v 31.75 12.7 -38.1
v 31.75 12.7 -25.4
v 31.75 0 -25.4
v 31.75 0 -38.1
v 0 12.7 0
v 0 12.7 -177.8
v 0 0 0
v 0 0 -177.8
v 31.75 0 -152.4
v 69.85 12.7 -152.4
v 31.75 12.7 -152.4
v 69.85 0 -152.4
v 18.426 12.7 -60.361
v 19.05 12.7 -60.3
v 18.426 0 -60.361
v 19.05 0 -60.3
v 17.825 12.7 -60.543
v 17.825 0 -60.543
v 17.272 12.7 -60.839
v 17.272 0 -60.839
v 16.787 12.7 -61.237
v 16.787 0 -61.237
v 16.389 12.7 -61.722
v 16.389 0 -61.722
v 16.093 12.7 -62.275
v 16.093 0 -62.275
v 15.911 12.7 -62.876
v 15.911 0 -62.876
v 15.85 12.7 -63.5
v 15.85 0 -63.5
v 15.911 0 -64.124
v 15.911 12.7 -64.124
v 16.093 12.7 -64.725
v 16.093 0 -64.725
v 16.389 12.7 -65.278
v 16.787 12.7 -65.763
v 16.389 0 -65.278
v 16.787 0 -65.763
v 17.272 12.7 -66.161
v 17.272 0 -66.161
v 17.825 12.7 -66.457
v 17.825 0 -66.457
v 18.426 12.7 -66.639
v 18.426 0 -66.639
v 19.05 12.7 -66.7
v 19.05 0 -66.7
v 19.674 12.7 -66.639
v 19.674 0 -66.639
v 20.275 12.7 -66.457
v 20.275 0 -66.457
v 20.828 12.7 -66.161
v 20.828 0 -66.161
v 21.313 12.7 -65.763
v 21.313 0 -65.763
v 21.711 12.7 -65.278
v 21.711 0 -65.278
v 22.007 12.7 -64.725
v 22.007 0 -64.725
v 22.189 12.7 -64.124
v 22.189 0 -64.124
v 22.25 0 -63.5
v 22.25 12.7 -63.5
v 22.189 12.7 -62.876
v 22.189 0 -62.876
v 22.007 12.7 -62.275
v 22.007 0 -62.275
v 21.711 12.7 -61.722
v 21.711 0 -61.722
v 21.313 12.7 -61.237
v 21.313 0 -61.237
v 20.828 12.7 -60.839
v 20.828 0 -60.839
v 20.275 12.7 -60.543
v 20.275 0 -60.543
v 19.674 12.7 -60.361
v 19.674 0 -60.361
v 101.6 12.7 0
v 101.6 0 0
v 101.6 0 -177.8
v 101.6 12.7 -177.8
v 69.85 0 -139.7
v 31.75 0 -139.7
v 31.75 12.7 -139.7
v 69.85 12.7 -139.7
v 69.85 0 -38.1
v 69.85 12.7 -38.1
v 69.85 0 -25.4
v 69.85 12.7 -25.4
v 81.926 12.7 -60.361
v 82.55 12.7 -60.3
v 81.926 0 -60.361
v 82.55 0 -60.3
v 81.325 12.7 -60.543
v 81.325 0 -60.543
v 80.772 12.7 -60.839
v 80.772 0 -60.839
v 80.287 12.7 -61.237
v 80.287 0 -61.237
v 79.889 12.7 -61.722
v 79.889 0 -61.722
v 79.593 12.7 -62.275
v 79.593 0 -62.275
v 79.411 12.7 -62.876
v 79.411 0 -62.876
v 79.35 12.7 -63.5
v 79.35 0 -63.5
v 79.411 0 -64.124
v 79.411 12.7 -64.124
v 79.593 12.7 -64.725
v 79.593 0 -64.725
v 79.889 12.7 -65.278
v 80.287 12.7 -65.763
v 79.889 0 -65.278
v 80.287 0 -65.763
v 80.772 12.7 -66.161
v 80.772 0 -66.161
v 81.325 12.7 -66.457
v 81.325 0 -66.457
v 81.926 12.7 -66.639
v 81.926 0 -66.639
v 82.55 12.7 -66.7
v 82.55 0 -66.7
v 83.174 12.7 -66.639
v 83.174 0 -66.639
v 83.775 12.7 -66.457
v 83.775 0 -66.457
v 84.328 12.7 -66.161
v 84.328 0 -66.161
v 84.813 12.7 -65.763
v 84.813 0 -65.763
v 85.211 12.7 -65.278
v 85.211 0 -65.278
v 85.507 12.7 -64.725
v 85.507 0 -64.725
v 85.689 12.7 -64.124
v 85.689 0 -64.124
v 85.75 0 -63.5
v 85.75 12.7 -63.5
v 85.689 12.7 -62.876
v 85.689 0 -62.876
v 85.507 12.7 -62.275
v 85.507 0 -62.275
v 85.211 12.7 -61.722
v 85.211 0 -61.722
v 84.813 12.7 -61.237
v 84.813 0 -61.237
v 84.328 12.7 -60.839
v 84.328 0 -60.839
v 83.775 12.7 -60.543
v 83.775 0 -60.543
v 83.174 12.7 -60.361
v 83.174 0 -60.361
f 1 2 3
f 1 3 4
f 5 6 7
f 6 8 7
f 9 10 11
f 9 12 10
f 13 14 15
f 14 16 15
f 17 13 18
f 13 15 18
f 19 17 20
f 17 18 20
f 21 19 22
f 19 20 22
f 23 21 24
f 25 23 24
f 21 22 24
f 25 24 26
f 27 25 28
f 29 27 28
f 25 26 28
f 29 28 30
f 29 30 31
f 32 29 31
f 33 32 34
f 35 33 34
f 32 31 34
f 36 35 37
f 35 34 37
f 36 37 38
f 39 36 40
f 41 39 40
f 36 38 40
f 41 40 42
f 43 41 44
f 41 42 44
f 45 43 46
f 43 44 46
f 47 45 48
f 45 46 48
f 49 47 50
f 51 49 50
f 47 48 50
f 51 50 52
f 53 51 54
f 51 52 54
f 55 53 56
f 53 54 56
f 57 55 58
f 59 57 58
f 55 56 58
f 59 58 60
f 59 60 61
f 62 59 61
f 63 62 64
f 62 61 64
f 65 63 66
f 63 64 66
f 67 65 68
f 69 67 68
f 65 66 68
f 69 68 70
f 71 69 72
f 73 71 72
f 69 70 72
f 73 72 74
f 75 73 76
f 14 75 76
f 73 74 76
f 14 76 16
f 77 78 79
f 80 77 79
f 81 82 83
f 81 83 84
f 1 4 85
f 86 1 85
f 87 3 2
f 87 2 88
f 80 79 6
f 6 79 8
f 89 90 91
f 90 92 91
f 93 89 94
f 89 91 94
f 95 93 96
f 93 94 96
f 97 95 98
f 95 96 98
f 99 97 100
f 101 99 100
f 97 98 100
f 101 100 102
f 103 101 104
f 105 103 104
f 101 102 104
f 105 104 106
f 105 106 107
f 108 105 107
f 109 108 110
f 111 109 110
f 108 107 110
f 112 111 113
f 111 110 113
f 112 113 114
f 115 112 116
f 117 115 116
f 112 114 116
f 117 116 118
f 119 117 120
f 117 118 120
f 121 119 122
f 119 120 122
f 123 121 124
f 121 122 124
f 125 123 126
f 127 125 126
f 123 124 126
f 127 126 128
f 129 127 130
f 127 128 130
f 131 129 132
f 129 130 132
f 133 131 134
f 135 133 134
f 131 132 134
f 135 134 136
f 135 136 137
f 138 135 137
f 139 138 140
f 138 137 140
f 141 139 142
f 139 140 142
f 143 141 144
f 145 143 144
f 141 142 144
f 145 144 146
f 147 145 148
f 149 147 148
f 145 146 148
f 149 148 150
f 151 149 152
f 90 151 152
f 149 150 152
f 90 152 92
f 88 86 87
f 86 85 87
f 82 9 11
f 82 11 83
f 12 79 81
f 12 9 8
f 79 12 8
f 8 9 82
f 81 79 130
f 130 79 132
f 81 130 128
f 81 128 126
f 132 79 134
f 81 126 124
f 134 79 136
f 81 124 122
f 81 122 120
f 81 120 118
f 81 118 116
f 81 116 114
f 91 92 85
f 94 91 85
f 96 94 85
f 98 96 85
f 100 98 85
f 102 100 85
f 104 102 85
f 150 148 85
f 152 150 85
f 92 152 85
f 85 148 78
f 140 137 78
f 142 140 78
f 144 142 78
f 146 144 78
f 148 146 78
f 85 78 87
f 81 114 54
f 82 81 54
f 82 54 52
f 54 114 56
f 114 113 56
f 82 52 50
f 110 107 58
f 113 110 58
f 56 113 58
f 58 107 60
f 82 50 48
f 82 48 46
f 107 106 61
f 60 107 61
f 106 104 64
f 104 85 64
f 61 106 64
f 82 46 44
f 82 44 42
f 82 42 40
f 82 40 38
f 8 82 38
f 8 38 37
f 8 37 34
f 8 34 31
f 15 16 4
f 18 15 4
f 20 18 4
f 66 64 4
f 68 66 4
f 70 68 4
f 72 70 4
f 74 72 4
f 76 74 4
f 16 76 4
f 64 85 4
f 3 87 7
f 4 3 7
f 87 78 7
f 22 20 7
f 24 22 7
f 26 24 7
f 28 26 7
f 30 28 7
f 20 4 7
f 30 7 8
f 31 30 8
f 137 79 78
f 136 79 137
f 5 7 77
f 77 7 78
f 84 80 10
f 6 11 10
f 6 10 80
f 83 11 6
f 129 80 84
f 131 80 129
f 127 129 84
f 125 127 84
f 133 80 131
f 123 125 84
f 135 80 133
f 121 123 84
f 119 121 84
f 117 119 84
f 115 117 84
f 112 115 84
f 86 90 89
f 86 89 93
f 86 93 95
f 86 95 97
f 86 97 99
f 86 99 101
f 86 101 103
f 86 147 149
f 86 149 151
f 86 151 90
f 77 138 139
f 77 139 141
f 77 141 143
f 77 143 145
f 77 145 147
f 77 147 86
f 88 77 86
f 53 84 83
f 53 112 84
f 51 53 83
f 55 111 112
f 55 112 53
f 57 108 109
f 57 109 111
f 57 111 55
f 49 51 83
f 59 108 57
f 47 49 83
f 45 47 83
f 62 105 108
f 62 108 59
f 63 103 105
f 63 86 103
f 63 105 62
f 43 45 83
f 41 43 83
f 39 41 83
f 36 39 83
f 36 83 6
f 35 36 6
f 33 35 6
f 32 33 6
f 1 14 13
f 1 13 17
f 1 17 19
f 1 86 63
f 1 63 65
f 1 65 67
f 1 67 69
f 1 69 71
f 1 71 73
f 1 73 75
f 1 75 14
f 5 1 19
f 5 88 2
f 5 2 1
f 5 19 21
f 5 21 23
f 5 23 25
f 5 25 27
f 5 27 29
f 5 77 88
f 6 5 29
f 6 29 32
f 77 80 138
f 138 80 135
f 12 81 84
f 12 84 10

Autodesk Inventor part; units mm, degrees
ref_plane "YZ Plane" through (0, 0, 0) normal (1, 0, 0) x (0, 1, 0)
ref_plane "XZ Plane" through (0, 0, 0) normal (0, 1, 0) x (-1, 0, 0)
ref_plane "XY Plane" through (0, 0, 0) normal (0, 0, 1) x (1, 0, 0)
sketch "Sketch1" plane through (0, 0, 0) normal (0, 1, 0) x (-1, 0, 0)
  point P0 (0, 0)
sketch "Sketch2" plane through (0, 0, 0) normal (0, 1, 0) x (-1, 0, 0)
  point P0 (0, 0)
sketch "Sketch3" plane through (0, 0, 0) normal (0, 1, 0) x (-1, 0, 0)
  point P0 (0, 0)
sketch "Sketch4" plane through (0, 0, 0) normal (0, 1, 0) x (-1, 0, 0)
  line L0 (0, 0) -> (-101.6, 0)
  line L1 (-101.6, 0) -> (-101.6, -177.8)
  line L2 (-101.6, -177.8) -> (0, -177.8)
  line L3 (0, -177.8) -> (0, 0)
  line L4 (-50.8, -25.4) -> (-69.85, -25.4)
  line L5 (-69.85, -25.4) -> (-31.75, -25.4)
  line L6 (-31.75, -25.4) -> (-31.75, -38.1)
  line L7 (-31.75, -38.1) -> (-69.85, -38.1)
  line L8 (-69.85, -38.1) -> (-69.85, -25.4)
  line L9 (-50.8, -177.8) -> (-50.8, -152.4)
  line L10 (-50.8, -152.4) -> (-31.75, -152.4)
  line L11 (-31.75, -152.4) -> (-31.75, -139.7)
  line L12 (-31.75, -139.7) -> (-69.85, -139.7)
  line L13 (-69.85, -139.7) -> (-69.85, -152.4)
  line L14 (-69.85, -152.4) -> (-50.8, -152.4)
  dimension "d0" = 101.6
  dimension "d1" = 177.8
  dimension "d3" = 19.05
  dimension "d4" = 38.1
  dimension "d5" = 12.7
  dimension "d6" = 38.1
  dimension "d7" = 25.4
  dimension "d8" = 19.05
  dimension "d9" = 12.7
  dimension "d10" = 38.1
  dimension "d11" = 12.7
extrude "Extrusion1" add sketch "Sketch4" along normal blind 12.7
sketch "Sketch5" plane through (0, 12.7, 0) normal (0, 1, 0) x (1, 0, 0)
  circle A0 centre (19.05, 63.5) radius 3.9688
  circle A1 centre (82.55, 63.5) radius 3.9687
  point P0 (0, 0)
  point P1 (31.75, 38.1)
  dimension "d19" = 7.9375
  dimension "d21" = 7.9375
hole "Hole1" at (19.05, 12.7, -63.5) direction (0, -1, 0) diameter 6.4008 end through all thread size "5/16-18 UNC" class "2B" standard "ANSI Unified Screw Threads"
hole "Hole2" at (82.55, 12.7, -63.5) direction (0, -1, 0) diameter 6.4008 end through all thread size "5/16-18 UNC" class "2B" standard "ANSI Unified Screw Threads"
equation "\"d23\" = d12"
equation "\"d30\" = d12"
equation "\"d12\" = 12.7"
properties part number "wrist_plate"
